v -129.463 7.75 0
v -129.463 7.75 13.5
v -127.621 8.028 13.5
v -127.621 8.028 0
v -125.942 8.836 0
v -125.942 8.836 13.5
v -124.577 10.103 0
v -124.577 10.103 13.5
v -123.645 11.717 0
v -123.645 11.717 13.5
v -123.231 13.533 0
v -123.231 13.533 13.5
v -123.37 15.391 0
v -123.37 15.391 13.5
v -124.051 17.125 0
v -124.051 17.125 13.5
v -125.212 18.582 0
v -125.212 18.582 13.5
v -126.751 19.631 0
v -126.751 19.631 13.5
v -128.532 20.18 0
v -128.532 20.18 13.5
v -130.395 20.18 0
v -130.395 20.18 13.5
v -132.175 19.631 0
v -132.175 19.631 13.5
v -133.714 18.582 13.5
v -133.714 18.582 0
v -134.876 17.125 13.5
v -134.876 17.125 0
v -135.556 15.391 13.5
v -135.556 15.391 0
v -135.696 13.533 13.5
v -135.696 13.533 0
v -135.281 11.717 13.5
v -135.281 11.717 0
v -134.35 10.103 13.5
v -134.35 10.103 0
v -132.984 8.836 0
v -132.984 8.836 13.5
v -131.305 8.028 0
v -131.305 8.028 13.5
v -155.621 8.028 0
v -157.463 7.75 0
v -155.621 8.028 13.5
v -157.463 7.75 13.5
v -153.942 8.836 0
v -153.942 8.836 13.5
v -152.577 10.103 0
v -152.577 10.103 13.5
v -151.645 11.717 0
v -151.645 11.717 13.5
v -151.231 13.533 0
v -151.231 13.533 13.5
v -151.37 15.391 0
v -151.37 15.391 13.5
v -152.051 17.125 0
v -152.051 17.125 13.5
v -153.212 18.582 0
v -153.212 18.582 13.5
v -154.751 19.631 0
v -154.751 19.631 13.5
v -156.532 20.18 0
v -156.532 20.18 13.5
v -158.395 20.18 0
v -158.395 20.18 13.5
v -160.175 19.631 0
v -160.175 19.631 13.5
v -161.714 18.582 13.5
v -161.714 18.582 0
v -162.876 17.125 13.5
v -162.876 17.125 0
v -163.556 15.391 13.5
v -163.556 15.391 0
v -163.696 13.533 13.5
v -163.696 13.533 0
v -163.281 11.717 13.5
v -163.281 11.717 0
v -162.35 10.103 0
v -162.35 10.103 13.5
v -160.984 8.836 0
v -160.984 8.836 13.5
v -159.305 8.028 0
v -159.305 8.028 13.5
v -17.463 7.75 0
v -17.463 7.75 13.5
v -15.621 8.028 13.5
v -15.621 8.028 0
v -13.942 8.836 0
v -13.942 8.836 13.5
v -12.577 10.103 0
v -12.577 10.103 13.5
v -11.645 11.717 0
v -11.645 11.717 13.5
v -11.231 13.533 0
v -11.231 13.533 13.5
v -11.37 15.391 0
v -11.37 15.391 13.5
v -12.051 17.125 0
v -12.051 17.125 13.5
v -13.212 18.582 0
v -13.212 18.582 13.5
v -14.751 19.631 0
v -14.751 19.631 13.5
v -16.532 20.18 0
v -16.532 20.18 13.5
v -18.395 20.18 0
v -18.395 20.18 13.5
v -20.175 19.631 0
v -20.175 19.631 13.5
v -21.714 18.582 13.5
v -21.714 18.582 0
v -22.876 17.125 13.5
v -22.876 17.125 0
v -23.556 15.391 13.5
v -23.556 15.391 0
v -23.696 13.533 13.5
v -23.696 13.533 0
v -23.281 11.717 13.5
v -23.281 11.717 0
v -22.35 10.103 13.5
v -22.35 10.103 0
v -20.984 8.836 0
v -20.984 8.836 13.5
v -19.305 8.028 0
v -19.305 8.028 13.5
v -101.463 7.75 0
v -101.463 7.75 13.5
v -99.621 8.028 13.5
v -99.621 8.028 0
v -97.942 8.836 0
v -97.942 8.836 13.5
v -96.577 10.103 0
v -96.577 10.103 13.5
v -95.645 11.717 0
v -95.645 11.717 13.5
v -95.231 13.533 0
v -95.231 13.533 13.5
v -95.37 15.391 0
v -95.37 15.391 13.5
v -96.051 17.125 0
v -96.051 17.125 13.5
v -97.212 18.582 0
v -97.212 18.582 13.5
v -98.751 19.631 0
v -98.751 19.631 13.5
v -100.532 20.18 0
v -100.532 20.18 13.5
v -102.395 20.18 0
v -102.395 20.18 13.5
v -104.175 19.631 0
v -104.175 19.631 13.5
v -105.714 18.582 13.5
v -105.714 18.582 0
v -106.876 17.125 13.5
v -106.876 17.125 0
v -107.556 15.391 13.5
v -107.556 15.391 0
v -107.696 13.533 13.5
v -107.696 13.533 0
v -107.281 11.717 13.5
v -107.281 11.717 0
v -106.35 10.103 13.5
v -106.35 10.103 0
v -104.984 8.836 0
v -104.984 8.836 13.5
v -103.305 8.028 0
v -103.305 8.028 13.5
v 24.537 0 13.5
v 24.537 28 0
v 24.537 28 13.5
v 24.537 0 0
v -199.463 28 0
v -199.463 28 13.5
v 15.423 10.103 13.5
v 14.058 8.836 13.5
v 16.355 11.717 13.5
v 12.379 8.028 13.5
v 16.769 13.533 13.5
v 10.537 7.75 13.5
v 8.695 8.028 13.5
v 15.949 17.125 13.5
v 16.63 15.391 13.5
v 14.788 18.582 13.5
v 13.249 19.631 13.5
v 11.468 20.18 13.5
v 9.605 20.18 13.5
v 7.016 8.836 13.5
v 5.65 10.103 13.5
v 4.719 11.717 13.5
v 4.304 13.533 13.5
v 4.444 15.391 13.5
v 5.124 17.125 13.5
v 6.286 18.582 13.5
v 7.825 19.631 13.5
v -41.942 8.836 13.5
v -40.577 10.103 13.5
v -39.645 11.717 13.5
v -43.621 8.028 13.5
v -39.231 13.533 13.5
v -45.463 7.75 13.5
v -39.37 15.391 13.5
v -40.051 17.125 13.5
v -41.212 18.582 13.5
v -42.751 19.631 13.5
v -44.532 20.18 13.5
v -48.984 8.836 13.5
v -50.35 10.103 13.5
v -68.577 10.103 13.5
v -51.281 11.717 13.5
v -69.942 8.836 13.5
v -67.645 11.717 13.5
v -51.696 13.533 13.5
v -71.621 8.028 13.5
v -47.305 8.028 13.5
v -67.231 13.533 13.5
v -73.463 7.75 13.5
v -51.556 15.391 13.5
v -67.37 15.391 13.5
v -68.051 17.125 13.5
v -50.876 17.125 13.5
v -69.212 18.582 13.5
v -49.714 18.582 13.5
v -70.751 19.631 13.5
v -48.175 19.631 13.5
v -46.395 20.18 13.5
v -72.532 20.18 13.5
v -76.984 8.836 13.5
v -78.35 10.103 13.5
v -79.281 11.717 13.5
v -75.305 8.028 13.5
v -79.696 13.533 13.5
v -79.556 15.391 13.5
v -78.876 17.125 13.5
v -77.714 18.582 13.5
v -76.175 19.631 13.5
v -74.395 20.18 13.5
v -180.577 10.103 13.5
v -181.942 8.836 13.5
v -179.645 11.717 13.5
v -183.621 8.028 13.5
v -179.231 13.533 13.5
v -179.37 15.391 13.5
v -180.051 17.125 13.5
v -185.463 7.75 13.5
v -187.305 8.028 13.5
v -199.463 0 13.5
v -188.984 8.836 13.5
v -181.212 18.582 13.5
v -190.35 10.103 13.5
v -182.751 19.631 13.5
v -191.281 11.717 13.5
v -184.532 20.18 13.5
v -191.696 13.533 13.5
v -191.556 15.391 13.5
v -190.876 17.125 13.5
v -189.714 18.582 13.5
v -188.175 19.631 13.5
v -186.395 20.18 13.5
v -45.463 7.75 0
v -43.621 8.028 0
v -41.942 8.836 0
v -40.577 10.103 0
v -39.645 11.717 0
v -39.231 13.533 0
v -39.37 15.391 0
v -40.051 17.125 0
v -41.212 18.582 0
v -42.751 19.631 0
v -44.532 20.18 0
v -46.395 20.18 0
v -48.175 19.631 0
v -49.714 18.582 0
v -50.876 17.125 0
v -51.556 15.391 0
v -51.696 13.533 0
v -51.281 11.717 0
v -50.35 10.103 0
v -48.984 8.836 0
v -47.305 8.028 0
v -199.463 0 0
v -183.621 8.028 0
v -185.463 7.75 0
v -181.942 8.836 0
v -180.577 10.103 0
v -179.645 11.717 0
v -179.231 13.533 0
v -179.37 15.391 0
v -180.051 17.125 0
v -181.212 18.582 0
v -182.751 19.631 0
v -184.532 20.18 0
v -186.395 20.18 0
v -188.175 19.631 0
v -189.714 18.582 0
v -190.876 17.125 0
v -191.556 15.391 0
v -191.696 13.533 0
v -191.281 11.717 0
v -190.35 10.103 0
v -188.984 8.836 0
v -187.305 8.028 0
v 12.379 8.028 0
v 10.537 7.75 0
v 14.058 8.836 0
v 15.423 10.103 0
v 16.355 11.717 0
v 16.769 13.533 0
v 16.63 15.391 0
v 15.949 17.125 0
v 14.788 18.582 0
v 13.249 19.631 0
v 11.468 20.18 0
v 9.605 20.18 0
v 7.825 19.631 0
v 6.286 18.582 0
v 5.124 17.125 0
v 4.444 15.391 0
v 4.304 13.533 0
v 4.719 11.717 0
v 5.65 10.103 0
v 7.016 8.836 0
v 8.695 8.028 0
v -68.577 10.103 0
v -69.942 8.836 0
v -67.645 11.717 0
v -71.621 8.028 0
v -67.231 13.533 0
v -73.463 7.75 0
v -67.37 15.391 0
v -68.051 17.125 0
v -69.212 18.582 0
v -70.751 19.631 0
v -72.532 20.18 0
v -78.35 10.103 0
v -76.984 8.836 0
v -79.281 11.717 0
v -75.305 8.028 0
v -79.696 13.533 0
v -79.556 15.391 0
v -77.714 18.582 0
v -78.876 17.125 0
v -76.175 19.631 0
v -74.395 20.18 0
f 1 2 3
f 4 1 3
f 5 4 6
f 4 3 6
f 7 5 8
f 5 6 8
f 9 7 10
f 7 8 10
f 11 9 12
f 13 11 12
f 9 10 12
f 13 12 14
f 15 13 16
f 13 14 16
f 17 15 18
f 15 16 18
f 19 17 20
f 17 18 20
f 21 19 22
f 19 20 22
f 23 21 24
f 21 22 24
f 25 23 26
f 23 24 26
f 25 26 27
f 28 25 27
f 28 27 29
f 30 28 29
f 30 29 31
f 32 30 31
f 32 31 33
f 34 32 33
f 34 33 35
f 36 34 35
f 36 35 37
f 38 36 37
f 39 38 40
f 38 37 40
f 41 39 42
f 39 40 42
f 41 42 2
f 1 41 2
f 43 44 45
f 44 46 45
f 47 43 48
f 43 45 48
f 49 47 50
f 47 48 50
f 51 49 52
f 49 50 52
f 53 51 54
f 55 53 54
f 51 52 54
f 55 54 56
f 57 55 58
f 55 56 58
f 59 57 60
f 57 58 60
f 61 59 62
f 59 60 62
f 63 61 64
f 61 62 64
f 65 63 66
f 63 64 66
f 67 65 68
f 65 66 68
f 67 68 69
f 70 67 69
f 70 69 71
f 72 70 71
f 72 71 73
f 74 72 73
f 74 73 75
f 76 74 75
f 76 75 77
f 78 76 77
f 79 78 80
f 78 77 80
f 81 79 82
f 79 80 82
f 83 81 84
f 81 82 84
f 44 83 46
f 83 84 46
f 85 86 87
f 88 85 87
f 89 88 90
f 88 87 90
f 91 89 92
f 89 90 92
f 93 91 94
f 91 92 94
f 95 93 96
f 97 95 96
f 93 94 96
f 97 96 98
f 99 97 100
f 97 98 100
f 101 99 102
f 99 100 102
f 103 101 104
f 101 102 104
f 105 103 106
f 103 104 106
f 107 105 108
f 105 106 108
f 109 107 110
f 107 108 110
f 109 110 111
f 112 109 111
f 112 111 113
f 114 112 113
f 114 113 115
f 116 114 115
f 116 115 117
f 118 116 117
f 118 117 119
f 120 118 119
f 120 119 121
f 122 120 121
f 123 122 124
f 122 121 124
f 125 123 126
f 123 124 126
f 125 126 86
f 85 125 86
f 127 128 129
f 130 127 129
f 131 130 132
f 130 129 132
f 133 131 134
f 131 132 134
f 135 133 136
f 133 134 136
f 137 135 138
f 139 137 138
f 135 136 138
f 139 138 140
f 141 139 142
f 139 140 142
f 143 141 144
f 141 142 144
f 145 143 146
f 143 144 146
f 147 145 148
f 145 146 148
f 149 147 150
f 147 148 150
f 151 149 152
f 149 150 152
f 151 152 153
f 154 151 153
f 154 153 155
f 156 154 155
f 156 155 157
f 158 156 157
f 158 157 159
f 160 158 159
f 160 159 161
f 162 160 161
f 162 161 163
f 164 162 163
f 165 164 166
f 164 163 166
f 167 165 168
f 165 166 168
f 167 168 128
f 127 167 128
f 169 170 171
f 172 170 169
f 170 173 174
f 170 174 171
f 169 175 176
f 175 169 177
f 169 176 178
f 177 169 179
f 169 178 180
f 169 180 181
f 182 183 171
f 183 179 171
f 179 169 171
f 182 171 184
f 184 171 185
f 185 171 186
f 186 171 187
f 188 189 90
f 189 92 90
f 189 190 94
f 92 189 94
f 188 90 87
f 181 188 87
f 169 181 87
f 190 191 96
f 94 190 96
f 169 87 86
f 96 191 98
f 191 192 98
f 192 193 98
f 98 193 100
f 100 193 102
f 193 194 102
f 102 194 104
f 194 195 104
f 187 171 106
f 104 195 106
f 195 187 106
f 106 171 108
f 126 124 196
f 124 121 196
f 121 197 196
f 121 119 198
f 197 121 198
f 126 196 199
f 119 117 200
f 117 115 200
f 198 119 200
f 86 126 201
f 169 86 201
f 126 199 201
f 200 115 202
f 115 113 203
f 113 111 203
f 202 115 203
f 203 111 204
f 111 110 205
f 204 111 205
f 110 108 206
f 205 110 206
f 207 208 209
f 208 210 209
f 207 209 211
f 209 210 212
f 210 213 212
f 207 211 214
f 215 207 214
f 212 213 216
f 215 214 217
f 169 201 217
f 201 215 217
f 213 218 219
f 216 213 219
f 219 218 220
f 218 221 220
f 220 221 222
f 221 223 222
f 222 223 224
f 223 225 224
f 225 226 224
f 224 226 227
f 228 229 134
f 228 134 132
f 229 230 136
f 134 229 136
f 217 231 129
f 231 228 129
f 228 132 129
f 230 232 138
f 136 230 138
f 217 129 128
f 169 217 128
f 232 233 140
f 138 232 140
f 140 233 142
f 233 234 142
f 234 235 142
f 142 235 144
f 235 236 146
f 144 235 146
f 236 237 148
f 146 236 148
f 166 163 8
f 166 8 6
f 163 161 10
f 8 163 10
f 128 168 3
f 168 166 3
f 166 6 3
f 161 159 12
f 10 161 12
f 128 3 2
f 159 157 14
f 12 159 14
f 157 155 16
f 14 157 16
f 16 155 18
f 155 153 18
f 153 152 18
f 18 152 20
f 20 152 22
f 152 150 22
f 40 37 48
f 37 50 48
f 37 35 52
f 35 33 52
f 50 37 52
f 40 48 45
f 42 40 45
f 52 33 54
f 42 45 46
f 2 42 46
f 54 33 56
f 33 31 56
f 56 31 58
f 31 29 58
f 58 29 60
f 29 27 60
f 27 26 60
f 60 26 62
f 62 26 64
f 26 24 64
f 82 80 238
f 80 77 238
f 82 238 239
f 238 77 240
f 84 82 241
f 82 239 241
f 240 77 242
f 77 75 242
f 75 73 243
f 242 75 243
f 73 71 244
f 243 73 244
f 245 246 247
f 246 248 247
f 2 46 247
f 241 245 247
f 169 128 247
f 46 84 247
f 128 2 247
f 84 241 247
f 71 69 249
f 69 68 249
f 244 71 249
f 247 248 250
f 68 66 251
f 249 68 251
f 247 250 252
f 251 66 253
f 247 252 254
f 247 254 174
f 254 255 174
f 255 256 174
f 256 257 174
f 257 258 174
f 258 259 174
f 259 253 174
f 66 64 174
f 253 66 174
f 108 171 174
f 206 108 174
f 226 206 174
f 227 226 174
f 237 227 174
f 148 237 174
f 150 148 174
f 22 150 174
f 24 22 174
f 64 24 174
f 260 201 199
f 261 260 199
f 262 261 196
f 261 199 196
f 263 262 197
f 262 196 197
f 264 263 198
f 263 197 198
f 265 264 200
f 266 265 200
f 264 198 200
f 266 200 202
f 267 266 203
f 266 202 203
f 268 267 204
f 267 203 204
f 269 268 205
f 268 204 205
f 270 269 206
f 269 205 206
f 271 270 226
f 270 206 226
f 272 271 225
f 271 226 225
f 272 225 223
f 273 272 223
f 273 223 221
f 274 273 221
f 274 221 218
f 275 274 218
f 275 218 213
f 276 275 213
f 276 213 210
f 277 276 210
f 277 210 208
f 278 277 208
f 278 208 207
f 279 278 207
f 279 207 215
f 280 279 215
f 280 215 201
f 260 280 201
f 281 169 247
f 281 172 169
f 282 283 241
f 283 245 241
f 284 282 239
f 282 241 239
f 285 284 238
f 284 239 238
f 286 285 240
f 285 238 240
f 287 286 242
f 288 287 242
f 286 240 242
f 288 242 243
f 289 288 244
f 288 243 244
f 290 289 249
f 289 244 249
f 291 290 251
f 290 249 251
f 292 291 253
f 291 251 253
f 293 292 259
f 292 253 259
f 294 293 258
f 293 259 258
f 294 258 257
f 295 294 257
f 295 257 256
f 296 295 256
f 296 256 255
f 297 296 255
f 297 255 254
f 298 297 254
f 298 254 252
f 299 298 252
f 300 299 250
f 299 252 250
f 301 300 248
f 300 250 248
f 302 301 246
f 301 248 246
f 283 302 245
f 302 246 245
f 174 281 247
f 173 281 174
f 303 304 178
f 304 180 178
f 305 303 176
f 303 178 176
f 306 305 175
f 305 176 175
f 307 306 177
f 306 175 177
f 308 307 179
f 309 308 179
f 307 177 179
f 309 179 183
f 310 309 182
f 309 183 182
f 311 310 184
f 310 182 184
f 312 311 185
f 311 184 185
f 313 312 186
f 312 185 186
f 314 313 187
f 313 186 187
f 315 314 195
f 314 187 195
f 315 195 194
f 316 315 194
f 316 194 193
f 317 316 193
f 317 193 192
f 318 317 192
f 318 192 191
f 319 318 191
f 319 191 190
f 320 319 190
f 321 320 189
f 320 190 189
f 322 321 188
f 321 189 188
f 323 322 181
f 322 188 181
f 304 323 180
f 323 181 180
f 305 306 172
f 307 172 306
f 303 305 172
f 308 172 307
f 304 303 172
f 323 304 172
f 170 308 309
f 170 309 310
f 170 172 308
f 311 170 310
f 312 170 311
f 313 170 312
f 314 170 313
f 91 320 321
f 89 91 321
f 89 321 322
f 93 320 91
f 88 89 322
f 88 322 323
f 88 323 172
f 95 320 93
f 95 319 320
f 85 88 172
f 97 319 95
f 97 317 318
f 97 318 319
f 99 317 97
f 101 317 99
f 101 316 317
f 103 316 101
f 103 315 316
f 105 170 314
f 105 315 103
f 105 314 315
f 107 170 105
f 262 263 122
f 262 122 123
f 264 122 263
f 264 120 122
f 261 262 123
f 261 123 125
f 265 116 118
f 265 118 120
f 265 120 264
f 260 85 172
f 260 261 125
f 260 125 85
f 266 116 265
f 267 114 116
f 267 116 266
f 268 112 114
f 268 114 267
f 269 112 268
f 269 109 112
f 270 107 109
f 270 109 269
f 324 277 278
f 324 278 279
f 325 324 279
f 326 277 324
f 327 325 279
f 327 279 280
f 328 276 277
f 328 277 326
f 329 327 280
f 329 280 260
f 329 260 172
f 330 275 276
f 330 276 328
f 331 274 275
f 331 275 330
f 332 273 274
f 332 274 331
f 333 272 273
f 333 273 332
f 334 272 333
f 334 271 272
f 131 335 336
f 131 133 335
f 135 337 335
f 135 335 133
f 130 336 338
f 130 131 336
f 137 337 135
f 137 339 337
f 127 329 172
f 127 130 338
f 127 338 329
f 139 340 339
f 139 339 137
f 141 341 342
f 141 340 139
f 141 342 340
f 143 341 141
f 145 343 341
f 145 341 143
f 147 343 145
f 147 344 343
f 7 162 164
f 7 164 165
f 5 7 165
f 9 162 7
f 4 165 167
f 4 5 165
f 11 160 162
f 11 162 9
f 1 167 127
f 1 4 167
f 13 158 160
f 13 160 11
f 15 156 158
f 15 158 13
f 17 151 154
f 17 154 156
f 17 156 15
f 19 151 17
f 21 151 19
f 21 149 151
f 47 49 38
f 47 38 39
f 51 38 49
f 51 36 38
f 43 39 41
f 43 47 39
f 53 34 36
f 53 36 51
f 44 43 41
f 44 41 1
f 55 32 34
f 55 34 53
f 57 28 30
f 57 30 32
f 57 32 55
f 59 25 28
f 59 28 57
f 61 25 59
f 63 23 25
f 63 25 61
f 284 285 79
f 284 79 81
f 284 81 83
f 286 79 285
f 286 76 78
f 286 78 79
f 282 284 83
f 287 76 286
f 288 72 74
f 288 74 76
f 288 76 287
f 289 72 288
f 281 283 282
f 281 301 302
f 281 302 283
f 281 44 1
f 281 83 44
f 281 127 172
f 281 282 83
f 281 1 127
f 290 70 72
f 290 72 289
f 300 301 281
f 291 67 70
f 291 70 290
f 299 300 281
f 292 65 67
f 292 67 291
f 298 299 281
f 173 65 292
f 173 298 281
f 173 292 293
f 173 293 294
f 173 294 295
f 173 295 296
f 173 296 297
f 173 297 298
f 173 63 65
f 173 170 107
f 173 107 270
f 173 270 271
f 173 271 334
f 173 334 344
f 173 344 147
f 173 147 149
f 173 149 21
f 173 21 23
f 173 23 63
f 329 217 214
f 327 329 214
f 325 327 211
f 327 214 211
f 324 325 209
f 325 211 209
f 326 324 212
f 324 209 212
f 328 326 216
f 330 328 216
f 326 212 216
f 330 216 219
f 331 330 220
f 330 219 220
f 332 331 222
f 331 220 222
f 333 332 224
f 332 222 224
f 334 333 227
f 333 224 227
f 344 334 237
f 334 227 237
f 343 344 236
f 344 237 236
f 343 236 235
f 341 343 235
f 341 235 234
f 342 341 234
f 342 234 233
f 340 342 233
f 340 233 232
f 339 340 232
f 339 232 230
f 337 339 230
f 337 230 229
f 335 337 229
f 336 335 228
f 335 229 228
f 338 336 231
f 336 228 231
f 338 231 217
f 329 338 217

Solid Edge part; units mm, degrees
sketch "Sketch1" plane through (0, 0, 0) normal (0, 0, 1) x (1, 0, 0)
  line L0 (-199.4632, 0) -> (-199.4632, 28)
  line L1 (-199.4632, 28) -> (24.5368, 28)
  line L2 (24.5368, 28) -> (24.5368, 0)
  line L3 (24.5368, 0) -> (-199.4632, 0)
  dimension "D1" = 28
  dimension "D2" = 224
extrude "Protrusion1" add sketch "Sketch1" along normal blind 13.5
hole "Hole_1" at (-157.4632, 14, 13.5) direction (0, 0, -1) diameter 12.5 end up to next
hole "Hole1" at (-129.4632, 14, 13.5) direction (0, 0, -1) diameter 12.5 end up to next
hole "Hole2" at (-101.4632, 14, 13.5) direction (0, 0, -1) diameter 12.5 end up to next
hole "Hole3" at (-73.4632, 14, 13.5) direction (0, 0, -1) diameter 12.5 end up to next
hole "Hole4" at (-45.4632, 14, 13.5) direction (0, 0, -1) diameter 12.5 end up to next
hole "Hole5" at (-17.4632, 14, 13.5) direction (0, 0, -1) diameter 12.5 end up to next
hole "Hole6" at (10.5368, 14, 13.5) direction (0, 0, -1) diameter 12.5 end up to next
hole "Hole7" at (-185.4632, 14, 13.5) direction (0, 0, -1) diameter 12.5 end up to next
